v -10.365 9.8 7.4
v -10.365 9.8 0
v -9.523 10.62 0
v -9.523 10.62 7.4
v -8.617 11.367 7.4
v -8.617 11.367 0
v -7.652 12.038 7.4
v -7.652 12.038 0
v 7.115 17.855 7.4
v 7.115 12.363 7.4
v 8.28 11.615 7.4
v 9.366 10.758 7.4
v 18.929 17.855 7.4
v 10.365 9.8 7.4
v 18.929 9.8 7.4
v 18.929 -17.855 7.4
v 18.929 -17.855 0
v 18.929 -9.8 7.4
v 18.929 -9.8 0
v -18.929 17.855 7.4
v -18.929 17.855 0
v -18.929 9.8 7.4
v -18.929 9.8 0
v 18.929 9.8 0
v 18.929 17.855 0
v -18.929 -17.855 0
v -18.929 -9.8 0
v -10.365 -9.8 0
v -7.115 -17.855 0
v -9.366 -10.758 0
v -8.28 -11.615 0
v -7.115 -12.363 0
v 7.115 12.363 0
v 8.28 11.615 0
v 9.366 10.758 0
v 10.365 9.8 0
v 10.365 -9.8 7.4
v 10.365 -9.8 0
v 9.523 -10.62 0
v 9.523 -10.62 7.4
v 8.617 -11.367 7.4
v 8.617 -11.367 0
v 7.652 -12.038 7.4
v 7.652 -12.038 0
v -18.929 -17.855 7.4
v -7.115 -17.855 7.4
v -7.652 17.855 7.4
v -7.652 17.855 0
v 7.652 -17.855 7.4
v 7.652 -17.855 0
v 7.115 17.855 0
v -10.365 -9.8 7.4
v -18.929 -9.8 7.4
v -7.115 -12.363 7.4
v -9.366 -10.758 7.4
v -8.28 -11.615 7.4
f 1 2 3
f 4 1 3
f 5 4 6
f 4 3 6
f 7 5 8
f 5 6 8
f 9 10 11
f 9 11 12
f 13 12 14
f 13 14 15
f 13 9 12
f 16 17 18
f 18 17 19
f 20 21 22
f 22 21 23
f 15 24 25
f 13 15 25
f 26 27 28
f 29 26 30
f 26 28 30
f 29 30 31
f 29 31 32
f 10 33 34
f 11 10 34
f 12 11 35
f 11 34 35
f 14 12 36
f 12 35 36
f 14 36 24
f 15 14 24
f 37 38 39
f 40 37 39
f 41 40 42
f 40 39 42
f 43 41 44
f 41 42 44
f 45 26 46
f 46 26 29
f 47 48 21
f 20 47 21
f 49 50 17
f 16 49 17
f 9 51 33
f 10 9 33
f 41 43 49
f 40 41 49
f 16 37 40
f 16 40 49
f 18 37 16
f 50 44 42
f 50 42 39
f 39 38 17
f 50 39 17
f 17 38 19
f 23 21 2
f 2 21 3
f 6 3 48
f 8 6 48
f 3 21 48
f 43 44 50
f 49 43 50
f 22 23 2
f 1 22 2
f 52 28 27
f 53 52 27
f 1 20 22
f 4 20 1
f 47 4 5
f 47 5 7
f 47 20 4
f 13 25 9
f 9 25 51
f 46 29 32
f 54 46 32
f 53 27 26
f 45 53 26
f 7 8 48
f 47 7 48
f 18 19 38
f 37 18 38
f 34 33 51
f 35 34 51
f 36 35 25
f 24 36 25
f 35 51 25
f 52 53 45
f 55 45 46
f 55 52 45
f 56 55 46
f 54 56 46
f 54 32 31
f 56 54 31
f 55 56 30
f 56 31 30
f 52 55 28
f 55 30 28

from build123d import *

# Parameters (mm, degrees)
F1_DEPTH = 7.4


with BuildPart() as f1:
    # F0 (on Top) → F1 (new body)
    with BuildSketch(Plane.XY):
        with BuildLine():
            ThreePointArc((-10.364721, 9.799883), (-9.077581, 11.002848), (-7.651964, 12.037965))
            Line((-7.651964, 12.037965), (-7.651964, 17.854581))
            Line((-7.651964, 17.854581), (-18.928541, 17.854581))
            Line((-18.928541, 17.854581), (-18.928541, 9.799883))
            Line((-18.928541, 9.799883), (-10.364721, 9.799883))
        make_face()
        with BuildLine():
            ThreePointArc((7.114984, 12.362934), (8.833308, 11.199902), (10.364721, 9.799883))
            Line((10.364721, 9.799883), (18.928541, 9.799883))
            Line((18.928541, 9.799883), (18.928541, 17.854581))
            Line((18.928541, 17.854581), (7.114984, 17.854581))
            Line((7.114984, 17.854581), (7.114984, 12.362934))
        make_face()
        with BuildLine():
            Line((18.928541, -9.799883), (10.364721, -9.799883))
            ThreePointArc((10.364721, -9.799883), (9.077581, -11.002848), (7.651964, -12.037965))
            Line((7.651964, -12.037965), (7.651964, -17.854581))
            Line((7.651964, -17.854581), (18.928541, -17.854581))
            Line((18.928541, -17.854581), (18.928541, -9.799883))
        make_face()
        with BuildLine():
            Line((-7.114984, -17.854581), (-7.114984, -12.362934))
            ThreePointArc((-7.114984, -12.362934), (-8.833308, -11.199902), (-10.364721, -9.799883))
            Line((-10.364721, -9.799883), (-18.928541, -9.799883))
            Line((-18.928541, -9.799883), (-18.928541, -17.854581))
            Line((-18.928541, -17.854581), (-7.114984, -17.854581))
        make_face()
    extrude(amount=F1_DEPTH)


solid = f1.part
